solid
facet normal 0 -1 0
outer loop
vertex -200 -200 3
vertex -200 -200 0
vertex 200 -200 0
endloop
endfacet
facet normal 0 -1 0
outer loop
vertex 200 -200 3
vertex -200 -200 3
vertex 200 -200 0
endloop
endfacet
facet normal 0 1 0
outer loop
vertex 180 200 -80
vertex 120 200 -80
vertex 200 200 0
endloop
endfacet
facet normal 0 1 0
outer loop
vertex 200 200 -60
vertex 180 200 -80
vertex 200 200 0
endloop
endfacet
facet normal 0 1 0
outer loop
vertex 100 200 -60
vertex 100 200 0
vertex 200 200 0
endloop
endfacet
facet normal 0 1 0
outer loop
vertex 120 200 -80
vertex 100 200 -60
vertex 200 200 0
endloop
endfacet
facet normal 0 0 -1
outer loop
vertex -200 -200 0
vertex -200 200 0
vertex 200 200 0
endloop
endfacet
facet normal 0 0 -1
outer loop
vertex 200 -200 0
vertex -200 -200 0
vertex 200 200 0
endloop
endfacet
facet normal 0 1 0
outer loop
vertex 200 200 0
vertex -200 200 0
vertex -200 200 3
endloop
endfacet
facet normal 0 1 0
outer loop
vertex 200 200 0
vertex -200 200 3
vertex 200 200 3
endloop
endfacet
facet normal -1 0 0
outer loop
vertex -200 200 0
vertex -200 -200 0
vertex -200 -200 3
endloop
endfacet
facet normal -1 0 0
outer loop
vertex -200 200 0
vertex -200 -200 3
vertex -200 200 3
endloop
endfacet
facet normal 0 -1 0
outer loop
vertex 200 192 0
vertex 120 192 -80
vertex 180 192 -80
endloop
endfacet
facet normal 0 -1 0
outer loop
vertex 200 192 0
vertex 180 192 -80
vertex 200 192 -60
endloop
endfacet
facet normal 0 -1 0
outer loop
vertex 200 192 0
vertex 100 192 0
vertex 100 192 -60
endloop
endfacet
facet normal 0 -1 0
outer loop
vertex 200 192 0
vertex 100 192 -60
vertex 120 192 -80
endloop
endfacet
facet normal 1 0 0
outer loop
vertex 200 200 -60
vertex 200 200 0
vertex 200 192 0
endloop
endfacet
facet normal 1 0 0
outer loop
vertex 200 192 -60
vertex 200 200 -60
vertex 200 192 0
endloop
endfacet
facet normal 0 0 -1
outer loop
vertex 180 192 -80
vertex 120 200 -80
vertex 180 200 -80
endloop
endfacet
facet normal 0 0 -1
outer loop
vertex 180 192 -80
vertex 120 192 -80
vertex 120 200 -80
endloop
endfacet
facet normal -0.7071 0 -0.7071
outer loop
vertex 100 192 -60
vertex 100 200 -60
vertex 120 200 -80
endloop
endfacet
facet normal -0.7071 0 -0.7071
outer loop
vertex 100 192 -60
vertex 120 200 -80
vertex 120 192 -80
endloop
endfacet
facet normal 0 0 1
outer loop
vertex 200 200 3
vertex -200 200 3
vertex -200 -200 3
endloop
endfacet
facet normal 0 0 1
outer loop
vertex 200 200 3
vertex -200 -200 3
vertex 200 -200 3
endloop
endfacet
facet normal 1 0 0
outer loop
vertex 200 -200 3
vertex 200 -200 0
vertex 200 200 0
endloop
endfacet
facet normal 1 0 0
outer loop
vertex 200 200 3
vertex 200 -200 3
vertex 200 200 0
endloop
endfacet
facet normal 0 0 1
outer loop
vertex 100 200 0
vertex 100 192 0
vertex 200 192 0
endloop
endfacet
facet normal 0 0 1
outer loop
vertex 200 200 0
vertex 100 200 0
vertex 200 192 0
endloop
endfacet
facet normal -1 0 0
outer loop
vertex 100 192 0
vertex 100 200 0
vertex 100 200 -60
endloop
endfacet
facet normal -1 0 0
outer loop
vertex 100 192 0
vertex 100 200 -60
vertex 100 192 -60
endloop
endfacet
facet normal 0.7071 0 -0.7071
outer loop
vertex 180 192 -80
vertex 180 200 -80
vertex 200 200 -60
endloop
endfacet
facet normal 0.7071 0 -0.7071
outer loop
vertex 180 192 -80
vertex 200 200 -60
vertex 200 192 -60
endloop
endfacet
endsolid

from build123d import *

# Parameters (mm, degrees)
F0_W     = 400
F0_H     = 400
F1_DEPTH = 3
F2_W     = 100
F2_H     = 8
F3_DEPTH = 80
F4_SIZE  = 20
F5_SIZE  = 20


with BuildPart() as f1:
    # F0 (on Top) → F1 (new body)
    with BuildSketch(Plane.XY):
        Rectangle(F0_W, F0_H)
    extrude(amount=F1_DEPTH)


with BuildPart() as f3:
    # F2 (on face) → F3 (new body)
    with BuildSketch(Plane(origin=(0, 0, 0), x_dir=(1, 0, 0), z_dir=(0, 0, -1))):
        with Locations((150, -196)):
            Rectangle(F2_W, F2_H)
    extrude(amount=F3_DEPTH)

    # F4
    f4_edges = [f3.edges().sort_by_distance(p)[0] for p in [
        (200, 196, -80),
    ]]
    chamfer(f4_edges, length=F4_SIZE)

    # F5
    f5_edges = [f3.edges().sort_by_distance(p)[0] for p in [
        (100, 196, -80),
    ]]
    chamfer(f5_edges, length=F5_SIZE)


solid = Compound([f1.part, f3.part])
